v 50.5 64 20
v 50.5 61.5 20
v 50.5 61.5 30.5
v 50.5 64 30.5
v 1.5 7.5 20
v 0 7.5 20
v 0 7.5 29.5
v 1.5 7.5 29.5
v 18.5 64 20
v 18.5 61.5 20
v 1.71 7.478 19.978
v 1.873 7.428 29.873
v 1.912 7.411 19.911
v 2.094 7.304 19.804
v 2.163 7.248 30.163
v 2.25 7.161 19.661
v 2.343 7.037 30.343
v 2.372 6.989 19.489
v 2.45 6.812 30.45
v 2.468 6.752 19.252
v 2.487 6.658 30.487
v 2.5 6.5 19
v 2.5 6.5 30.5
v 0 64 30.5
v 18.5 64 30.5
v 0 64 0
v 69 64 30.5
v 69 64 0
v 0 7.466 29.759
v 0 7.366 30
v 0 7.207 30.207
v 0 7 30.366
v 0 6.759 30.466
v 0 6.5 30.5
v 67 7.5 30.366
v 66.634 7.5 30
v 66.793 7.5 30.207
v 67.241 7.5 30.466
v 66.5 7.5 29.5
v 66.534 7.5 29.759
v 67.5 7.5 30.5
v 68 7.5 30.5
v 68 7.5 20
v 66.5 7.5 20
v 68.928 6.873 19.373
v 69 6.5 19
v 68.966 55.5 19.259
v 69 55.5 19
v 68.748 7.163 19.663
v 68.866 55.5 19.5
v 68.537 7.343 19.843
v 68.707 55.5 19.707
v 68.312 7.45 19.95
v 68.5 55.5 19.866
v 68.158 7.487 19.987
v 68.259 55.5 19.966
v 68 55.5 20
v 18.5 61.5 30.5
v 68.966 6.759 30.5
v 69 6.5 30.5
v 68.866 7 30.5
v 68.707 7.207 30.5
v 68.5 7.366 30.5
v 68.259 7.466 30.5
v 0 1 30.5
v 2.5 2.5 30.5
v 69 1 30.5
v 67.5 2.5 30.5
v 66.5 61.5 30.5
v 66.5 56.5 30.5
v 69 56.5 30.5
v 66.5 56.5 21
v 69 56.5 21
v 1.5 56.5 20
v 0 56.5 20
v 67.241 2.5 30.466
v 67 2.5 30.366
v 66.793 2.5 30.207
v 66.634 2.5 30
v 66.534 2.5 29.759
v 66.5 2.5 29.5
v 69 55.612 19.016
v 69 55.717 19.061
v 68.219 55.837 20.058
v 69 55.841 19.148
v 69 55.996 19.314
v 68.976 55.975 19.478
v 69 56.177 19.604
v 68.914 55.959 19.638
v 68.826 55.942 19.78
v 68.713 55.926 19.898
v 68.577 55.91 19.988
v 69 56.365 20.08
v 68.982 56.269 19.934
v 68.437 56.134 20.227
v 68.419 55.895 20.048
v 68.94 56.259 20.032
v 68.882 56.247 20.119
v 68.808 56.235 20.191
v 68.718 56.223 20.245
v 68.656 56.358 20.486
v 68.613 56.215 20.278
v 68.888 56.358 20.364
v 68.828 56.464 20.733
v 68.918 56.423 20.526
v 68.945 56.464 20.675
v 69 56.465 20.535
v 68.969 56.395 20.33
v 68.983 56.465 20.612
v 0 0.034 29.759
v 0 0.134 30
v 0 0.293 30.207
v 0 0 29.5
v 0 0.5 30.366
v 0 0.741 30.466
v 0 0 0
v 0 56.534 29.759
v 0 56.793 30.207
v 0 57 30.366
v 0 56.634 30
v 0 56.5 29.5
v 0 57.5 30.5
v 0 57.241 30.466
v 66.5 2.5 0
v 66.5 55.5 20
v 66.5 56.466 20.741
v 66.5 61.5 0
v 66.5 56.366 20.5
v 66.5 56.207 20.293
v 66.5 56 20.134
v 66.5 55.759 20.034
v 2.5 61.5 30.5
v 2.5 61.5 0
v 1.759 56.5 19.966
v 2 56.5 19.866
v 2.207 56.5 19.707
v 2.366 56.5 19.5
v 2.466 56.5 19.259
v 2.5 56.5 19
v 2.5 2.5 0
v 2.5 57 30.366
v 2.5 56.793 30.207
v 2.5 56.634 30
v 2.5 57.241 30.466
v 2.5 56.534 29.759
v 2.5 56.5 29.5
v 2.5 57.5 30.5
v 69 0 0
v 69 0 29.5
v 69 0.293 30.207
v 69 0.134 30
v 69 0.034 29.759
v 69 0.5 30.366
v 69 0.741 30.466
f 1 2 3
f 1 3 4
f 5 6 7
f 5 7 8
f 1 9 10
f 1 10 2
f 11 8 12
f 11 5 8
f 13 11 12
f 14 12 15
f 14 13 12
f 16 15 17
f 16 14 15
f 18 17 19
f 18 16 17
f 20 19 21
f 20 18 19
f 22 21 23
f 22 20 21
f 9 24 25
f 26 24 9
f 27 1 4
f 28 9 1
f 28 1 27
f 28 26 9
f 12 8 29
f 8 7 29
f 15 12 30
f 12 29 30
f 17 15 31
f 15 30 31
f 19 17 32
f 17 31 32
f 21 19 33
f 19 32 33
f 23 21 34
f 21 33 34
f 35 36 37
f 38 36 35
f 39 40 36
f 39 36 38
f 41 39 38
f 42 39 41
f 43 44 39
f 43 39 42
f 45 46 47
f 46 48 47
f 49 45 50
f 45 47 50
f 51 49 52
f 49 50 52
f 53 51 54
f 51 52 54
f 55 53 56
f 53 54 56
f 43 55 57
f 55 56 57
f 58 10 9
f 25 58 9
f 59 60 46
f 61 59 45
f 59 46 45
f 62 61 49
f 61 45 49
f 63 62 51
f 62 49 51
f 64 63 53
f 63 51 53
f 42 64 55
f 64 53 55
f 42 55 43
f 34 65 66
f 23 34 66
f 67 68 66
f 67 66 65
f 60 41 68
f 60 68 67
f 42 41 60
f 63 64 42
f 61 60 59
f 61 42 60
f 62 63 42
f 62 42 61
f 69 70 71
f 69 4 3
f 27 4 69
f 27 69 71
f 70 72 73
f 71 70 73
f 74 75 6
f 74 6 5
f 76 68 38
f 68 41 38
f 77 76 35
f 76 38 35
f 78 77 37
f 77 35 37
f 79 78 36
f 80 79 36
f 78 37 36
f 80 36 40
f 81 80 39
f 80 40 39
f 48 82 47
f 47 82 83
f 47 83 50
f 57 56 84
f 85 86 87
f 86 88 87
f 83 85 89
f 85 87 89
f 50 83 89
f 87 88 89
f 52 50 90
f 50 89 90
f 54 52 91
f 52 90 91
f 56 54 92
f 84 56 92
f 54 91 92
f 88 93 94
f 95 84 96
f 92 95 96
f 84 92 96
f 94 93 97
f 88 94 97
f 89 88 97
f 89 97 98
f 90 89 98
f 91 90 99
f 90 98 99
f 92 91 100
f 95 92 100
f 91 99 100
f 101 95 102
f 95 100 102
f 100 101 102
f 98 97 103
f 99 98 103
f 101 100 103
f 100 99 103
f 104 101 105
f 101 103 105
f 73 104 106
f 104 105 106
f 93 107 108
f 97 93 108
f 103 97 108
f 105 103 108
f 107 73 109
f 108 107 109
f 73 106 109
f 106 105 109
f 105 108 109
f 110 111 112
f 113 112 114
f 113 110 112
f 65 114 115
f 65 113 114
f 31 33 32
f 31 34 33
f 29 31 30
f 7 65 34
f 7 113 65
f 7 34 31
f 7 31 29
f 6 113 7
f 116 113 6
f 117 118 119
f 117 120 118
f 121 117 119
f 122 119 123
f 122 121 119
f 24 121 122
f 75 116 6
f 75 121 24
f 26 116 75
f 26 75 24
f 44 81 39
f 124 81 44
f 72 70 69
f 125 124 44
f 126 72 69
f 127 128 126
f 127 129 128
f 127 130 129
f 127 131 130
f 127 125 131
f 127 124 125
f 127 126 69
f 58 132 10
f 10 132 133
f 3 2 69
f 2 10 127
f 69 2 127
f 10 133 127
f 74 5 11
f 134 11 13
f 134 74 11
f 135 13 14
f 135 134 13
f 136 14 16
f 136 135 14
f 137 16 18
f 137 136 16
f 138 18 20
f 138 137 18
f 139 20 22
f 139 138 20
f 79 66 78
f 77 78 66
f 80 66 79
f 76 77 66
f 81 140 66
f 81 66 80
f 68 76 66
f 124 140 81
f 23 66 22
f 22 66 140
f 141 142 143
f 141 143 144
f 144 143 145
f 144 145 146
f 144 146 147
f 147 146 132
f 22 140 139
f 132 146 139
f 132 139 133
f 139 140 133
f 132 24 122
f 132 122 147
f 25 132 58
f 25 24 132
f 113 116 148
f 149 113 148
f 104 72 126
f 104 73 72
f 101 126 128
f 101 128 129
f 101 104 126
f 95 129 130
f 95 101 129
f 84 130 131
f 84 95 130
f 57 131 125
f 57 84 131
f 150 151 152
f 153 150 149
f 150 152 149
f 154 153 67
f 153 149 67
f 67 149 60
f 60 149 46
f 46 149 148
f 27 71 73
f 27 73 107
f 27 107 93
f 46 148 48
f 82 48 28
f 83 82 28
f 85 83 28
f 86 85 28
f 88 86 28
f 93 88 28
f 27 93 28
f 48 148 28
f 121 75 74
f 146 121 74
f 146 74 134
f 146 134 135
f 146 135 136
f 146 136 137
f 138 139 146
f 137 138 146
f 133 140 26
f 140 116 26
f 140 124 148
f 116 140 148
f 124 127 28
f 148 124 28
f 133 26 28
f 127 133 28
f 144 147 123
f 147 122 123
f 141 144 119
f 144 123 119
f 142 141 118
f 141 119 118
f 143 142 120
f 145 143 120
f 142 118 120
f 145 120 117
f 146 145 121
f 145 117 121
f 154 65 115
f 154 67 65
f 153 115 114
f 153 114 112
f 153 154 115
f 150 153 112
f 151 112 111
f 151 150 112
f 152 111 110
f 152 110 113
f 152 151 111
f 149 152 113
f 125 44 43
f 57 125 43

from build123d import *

# Parameters (mm, degrees)
BOX002_W     = 200
BOX002_H     = 49
BOX002_DEPTH = 12
BOX003_W     = 32
BOX003_H     = 200
BOX003_DEPTH = 12
BOX_W        = 64
BOX_H        = 59
BOX_DEPTH    = 30.5
BOX001_W     = 69
BOX001_H     = 64
BOX001_DEPTH = 30.5
FILLET_R     = 1


with BuildPart() as cut_cube:
    # Box002 → Box002 (new body)
    with BuildSketch(Plane(origin=(-50, 7.5, 20), x_dir=(1, 0, 0), z_dir=(0, 0, 1))):
        with Locations((100, 24.5)):
            Rectangle(BOX002_W, BOX002_H)
    extrude(amount=BOX002_DEPTH)


with BuildPart() as cut_cube001:
    # Box003 → Box003 (new body)
    with BuildSketch(Plane(origin=(18.5, 7.5, 20), x_dir=(1, 0, 0), z_dir=(0, 0, 1))):
        with Locations((16, 100)):
            Rectangle(BOX003_W, BOX003_H)
    extrude(amount=BOX003_DEPTH)


with BuildPart() as fusion:
    # Box → Box (new body)
    with BuildSketch(Plane(origin=(2.5, 2.5, 0), x_dir=(1, 0, 0), z_dir=(0, 0, 1))):
        with Locations((32, 29.5)):
            Rectangle(BOX_W, BOX_H)
    extrude(amount=BOX_DEPTH)

    # Fusion: union cut cube, cut cube001
    add(cut_cube.part)
    add(cut_cube001.part)


with BuildPart() as fillet_body:
    # Box001 → Box001 (new body)
    with BuildSketch(Plane.XY):
        with Locations((34.5, 32)):
            Rectangle(BOX001_W, BOX001_H)
    extrude(amount=BOX001_DEPTH)

    # Cut: cut Fusion
    add(fusion.part, mode=Mode.SUBTRACT)

    # Fillet
    fillet_edges = [fillet_body.edges().sort_by_distance(p)[0] for p in [
        (1.25, 7.5, 30.5),
        (66.5, 5, 30.5),
        (34.5, 0, 30.5),
        (2.5, 7.5, 25.25),
        (2.5, 32, 20),
        (1.25, 56.5, 30.5),
        (69, 7.5, 25.25),
        (69, 32, 20),
        (67.75, 56.5, 20),
    ]]
    fillet(fillet_edges, radius=FILLET_R)


solid = fillet_body.part
